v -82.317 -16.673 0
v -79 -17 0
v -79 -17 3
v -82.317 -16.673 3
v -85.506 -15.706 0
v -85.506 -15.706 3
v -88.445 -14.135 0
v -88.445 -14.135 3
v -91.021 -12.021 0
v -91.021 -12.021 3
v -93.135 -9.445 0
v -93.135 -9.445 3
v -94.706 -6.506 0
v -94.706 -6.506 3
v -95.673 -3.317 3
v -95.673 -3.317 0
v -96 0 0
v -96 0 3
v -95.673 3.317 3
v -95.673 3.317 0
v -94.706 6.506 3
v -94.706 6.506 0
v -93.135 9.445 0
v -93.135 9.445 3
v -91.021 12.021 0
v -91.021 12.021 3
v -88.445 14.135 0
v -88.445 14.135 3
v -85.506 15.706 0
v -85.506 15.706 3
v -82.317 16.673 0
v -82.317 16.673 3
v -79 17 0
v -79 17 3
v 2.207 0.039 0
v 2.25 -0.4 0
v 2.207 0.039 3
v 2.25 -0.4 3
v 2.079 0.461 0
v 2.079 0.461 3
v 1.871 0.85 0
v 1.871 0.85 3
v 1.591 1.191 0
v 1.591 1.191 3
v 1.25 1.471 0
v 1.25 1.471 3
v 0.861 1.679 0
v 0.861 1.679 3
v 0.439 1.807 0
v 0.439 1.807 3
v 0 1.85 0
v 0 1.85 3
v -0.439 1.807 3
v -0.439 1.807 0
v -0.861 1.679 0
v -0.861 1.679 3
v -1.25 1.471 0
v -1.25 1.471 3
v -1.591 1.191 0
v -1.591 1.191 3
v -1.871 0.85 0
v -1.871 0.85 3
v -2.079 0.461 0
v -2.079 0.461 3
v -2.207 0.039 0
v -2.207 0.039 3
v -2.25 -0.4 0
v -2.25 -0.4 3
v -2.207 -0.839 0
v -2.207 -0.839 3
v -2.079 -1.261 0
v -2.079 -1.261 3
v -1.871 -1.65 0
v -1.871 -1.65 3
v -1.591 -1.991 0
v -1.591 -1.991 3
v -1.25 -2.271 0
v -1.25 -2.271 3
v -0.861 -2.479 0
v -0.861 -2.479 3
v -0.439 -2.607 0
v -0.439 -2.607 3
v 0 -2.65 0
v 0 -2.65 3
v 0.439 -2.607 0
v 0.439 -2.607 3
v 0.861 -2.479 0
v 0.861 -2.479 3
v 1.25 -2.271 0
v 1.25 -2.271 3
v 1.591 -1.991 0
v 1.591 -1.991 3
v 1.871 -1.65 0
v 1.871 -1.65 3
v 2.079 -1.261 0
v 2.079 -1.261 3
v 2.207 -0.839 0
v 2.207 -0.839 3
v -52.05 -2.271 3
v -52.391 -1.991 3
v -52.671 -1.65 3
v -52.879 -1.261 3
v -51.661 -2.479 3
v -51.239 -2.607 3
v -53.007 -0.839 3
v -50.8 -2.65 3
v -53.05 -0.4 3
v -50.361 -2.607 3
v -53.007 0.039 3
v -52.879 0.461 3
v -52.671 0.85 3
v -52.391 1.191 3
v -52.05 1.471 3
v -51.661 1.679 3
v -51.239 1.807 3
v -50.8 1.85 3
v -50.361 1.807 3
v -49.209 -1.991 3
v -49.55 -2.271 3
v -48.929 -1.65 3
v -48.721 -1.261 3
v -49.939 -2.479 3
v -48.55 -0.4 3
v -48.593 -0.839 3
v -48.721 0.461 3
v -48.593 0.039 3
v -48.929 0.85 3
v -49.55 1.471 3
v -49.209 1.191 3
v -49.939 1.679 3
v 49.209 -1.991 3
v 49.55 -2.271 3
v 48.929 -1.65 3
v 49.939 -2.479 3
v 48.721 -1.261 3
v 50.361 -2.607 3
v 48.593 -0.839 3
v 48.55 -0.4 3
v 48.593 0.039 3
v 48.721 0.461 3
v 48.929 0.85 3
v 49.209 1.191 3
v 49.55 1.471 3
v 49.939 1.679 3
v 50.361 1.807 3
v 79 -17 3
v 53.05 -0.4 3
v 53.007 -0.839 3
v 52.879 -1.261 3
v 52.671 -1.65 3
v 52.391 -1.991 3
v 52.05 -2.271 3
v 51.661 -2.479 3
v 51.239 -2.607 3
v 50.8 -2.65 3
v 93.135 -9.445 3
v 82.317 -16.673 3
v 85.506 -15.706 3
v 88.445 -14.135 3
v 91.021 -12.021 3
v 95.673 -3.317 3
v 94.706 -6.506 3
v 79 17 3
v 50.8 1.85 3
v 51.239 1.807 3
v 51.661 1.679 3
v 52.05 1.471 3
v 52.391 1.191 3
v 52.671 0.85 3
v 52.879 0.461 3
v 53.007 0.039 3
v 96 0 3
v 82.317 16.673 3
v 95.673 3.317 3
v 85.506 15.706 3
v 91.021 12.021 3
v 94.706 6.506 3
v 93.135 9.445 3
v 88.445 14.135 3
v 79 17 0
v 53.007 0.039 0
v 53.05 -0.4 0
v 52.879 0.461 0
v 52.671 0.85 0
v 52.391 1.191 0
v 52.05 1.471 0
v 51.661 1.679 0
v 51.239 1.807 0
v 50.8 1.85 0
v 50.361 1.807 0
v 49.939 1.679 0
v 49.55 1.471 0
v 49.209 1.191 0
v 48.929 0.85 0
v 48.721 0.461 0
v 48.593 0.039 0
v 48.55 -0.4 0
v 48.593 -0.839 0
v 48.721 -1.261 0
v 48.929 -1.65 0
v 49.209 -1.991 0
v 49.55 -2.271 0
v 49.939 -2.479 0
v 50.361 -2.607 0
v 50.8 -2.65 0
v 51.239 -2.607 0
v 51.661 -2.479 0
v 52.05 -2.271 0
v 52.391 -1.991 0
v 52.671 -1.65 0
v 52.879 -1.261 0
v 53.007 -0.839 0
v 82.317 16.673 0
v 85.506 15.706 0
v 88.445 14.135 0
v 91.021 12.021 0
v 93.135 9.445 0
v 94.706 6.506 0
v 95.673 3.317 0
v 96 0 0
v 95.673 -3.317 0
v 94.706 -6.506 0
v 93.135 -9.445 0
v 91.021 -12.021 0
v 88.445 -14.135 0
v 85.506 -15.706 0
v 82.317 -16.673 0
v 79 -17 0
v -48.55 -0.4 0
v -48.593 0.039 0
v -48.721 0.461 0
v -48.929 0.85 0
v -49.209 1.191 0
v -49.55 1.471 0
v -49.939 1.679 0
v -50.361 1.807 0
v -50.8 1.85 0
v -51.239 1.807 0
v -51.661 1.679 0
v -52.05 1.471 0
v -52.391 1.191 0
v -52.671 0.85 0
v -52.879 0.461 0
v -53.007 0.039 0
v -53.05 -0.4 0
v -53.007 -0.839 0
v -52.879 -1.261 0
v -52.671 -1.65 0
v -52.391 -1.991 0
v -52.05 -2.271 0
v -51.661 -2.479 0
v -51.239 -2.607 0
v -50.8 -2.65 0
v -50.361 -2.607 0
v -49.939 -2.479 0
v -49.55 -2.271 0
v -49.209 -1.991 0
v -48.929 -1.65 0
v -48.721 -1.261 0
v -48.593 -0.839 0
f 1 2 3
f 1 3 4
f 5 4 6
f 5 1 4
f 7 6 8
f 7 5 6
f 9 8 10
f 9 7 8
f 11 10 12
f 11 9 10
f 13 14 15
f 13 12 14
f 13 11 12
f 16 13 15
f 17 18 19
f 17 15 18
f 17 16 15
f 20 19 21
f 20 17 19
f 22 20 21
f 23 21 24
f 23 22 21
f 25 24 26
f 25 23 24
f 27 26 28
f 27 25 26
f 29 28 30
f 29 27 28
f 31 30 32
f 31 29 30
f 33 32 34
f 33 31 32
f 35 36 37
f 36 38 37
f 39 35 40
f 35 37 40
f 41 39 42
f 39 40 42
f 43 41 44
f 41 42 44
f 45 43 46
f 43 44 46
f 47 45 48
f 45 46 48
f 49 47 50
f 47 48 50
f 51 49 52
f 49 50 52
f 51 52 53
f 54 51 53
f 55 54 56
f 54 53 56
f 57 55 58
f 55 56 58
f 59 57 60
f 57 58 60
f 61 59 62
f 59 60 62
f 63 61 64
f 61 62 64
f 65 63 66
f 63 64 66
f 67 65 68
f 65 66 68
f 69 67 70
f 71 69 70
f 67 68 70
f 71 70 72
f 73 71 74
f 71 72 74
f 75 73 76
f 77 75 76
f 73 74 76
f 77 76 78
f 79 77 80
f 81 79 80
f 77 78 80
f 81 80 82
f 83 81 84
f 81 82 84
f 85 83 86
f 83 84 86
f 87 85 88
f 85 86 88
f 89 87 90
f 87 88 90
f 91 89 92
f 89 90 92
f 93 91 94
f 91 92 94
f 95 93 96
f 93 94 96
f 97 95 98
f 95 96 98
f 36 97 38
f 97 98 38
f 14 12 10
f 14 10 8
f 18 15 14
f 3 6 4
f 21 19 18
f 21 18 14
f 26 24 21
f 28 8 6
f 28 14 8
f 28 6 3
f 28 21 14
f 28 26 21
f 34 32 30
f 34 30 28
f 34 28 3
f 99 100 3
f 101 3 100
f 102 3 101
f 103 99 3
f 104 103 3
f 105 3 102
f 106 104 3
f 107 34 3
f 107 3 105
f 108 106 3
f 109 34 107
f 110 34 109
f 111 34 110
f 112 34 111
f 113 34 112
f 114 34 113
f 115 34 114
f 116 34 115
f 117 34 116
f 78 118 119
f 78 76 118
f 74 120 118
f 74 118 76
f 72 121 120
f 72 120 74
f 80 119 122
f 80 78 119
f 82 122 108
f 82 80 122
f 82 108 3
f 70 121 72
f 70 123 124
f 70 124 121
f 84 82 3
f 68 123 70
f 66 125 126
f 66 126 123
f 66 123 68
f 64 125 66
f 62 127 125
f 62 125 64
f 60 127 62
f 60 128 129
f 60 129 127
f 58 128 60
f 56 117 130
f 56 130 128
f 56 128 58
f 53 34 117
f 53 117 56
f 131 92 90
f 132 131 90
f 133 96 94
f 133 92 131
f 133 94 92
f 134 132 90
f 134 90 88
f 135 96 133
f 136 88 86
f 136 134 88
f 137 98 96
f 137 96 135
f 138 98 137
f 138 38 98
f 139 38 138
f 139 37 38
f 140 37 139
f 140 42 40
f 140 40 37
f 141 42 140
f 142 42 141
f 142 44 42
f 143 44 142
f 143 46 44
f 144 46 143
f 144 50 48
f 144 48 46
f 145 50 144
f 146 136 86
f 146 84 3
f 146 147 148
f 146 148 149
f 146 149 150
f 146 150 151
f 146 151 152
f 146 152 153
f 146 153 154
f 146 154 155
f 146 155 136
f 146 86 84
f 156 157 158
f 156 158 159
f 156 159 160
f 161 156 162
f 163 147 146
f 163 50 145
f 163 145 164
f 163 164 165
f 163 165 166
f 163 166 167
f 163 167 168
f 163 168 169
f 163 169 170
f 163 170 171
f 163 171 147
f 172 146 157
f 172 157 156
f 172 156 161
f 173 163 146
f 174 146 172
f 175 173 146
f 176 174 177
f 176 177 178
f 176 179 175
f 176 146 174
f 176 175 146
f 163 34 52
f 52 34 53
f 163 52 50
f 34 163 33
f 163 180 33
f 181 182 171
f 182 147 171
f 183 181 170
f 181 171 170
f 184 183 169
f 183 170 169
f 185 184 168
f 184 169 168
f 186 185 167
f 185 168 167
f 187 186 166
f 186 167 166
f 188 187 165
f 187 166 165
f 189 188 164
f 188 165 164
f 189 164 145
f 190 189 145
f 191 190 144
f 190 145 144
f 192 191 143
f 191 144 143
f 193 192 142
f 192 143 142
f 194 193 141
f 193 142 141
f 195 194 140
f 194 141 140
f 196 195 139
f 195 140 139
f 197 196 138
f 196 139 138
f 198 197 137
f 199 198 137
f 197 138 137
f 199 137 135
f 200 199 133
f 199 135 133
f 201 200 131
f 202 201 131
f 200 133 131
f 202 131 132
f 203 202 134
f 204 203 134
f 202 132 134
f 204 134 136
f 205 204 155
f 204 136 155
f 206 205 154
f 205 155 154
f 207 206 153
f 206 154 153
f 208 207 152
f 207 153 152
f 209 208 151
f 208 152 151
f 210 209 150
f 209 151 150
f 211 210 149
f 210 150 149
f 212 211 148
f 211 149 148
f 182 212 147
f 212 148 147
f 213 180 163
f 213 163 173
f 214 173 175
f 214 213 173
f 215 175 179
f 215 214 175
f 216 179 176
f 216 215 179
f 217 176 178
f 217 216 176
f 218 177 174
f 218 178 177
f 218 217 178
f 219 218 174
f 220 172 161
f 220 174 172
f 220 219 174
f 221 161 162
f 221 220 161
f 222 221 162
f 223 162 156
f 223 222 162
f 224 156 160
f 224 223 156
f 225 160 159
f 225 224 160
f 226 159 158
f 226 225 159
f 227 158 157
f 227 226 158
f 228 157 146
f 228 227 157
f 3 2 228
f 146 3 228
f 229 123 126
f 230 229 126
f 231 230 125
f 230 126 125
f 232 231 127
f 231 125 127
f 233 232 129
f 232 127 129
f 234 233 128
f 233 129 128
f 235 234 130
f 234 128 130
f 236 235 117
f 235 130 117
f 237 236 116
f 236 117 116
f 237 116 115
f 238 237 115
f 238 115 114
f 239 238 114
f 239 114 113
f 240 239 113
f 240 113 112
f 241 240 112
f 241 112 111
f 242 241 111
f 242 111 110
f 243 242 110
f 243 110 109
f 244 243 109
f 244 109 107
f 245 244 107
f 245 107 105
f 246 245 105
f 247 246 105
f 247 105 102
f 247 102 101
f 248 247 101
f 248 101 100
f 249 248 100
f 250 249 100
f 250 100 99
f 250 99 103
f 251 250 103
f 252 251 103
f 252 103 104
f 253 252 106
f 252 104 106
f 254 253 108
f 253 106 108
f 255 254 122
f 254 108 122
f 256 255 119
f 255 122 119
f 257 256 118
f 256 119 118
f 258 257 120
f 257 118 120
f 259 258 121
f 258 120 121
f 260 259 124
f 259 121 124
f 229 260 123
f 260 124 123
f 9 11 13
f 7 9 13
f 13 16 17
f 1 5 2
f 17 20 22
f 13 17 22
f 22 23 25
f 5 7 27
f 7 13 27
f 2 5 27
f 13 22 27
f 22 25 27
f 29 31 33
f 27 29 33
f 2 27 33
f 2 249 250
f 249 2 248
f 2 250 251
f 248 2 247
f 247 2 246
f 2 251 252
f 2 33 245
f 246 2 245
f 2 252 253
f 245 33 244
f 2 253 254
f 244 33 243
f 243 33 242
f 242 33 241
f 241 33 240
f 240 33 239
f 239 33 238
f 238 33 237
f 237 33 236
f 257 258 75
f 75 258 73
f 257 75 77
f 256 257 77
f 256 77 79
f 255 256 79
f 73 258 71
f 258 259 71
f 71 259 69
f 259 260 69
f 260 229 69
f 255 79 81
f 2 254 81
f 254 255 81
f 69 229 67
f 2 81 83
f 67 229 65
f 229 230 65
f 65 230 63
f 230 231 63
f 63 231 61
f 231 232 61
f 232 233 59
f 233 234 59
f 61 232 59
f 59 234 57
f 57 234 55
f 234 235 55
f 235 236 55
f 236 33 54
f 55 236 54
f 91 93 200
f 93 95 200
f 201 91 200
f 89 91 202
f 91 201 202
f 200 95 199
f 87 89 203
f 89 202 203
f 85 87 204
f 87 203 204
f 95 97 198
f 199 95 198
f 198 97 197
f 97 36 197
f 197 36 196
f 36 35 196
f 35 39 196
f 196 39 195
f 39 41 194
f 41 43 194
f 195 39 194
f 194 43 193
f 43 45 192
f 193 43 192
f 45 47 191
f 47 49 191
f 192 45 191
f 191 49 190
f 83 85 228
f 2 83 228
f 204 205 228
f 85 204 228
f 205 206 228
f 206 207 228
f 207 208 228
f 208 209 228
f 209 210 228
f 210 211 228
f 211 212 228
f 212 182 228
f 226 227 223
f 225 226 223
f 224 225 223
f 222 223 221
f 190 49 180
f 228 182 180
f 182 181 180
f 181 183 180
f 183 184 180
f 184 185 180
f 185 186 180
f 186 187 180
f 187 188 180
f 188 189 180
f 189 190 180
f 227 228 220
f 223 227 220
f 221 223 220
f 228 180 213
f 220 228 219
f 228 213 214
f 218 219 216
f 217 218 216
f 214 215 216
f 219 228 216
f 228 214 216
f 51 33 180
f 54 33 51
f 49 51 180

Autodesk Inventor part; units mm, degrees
ref_plane "YZ Plane" through (0, 0, 0) normal (1, 0, 0) x (0, 1, 0)
ref_plane "XZ Plane" through (0, 0, 0) normal (0, 1, 0) x (-1, 0, 0)
ref_plane "XY Plane" through (0, 0, 0) normal (0, 0, 1) x (1, 0, 0)
sketch "Sketch1" plane through (0, 0, 0) normal (0, 0, 1) x (1, 0, 0)
  line L0 (-79, 0) -> (79, 0) construction
  line L1 (-79, -17) -> (79, -17)
  line L2 (79, 17) -> (-79, 17)
  arc A0 (-79, 17) -> (-79, -17) centre (-79, 0) ccw
  arc A1 (79, -17) -> (79, 17) centre (79, 0) ccw
  point P0 (0, 0)
  dimension "d0" = 79
  dimension "d1" = 34
extrude "Extrusion1" add sketch "Sketch1" along normal blind 3
sketch "Sketch2" plane through (0, 0, 3) normal (0, 0, 1) x (1, 0, 0)
  line L0 (63.5, 11.5) -> (-63.5, 11.5)
  line L1 (-63.5, 11.5) -> (-63.5, -11.5)
  line L2 (-63.5, -11.5) -> (63.5, -11.5)
  line L3 (63.5, -11.5) -> (63.5, 11.5)
  line L4 (63.5, 11.5) -> (-63.5, -11.5) construction
  line L5 (-63.5, 11.5) -> (63.5, -11.5) construction
  line L6 (-63.5, 0) -> (63.5, 0)
  circle A0 centre (-50.8, -0.4) radius 2.25
  circle A1 centre (50.8, -0.4) radius 2.25
  circle A2 centre (0, -0.4) radius 2.25
  point P0 (0, 0)
  dimension "d4" = 23
  dimension "d5" = 4.5
  dimension "d6" = 4.5
  dimension "d7" = 4.5
extrude "Extrusion2" cut sketch "Sketch2" against normal through all contours A1 L6 | L6 A1 | A0 L6 | L6 A0 | A2 L6 | L6 A2
properties part number "AMR_Handle_Flap"
